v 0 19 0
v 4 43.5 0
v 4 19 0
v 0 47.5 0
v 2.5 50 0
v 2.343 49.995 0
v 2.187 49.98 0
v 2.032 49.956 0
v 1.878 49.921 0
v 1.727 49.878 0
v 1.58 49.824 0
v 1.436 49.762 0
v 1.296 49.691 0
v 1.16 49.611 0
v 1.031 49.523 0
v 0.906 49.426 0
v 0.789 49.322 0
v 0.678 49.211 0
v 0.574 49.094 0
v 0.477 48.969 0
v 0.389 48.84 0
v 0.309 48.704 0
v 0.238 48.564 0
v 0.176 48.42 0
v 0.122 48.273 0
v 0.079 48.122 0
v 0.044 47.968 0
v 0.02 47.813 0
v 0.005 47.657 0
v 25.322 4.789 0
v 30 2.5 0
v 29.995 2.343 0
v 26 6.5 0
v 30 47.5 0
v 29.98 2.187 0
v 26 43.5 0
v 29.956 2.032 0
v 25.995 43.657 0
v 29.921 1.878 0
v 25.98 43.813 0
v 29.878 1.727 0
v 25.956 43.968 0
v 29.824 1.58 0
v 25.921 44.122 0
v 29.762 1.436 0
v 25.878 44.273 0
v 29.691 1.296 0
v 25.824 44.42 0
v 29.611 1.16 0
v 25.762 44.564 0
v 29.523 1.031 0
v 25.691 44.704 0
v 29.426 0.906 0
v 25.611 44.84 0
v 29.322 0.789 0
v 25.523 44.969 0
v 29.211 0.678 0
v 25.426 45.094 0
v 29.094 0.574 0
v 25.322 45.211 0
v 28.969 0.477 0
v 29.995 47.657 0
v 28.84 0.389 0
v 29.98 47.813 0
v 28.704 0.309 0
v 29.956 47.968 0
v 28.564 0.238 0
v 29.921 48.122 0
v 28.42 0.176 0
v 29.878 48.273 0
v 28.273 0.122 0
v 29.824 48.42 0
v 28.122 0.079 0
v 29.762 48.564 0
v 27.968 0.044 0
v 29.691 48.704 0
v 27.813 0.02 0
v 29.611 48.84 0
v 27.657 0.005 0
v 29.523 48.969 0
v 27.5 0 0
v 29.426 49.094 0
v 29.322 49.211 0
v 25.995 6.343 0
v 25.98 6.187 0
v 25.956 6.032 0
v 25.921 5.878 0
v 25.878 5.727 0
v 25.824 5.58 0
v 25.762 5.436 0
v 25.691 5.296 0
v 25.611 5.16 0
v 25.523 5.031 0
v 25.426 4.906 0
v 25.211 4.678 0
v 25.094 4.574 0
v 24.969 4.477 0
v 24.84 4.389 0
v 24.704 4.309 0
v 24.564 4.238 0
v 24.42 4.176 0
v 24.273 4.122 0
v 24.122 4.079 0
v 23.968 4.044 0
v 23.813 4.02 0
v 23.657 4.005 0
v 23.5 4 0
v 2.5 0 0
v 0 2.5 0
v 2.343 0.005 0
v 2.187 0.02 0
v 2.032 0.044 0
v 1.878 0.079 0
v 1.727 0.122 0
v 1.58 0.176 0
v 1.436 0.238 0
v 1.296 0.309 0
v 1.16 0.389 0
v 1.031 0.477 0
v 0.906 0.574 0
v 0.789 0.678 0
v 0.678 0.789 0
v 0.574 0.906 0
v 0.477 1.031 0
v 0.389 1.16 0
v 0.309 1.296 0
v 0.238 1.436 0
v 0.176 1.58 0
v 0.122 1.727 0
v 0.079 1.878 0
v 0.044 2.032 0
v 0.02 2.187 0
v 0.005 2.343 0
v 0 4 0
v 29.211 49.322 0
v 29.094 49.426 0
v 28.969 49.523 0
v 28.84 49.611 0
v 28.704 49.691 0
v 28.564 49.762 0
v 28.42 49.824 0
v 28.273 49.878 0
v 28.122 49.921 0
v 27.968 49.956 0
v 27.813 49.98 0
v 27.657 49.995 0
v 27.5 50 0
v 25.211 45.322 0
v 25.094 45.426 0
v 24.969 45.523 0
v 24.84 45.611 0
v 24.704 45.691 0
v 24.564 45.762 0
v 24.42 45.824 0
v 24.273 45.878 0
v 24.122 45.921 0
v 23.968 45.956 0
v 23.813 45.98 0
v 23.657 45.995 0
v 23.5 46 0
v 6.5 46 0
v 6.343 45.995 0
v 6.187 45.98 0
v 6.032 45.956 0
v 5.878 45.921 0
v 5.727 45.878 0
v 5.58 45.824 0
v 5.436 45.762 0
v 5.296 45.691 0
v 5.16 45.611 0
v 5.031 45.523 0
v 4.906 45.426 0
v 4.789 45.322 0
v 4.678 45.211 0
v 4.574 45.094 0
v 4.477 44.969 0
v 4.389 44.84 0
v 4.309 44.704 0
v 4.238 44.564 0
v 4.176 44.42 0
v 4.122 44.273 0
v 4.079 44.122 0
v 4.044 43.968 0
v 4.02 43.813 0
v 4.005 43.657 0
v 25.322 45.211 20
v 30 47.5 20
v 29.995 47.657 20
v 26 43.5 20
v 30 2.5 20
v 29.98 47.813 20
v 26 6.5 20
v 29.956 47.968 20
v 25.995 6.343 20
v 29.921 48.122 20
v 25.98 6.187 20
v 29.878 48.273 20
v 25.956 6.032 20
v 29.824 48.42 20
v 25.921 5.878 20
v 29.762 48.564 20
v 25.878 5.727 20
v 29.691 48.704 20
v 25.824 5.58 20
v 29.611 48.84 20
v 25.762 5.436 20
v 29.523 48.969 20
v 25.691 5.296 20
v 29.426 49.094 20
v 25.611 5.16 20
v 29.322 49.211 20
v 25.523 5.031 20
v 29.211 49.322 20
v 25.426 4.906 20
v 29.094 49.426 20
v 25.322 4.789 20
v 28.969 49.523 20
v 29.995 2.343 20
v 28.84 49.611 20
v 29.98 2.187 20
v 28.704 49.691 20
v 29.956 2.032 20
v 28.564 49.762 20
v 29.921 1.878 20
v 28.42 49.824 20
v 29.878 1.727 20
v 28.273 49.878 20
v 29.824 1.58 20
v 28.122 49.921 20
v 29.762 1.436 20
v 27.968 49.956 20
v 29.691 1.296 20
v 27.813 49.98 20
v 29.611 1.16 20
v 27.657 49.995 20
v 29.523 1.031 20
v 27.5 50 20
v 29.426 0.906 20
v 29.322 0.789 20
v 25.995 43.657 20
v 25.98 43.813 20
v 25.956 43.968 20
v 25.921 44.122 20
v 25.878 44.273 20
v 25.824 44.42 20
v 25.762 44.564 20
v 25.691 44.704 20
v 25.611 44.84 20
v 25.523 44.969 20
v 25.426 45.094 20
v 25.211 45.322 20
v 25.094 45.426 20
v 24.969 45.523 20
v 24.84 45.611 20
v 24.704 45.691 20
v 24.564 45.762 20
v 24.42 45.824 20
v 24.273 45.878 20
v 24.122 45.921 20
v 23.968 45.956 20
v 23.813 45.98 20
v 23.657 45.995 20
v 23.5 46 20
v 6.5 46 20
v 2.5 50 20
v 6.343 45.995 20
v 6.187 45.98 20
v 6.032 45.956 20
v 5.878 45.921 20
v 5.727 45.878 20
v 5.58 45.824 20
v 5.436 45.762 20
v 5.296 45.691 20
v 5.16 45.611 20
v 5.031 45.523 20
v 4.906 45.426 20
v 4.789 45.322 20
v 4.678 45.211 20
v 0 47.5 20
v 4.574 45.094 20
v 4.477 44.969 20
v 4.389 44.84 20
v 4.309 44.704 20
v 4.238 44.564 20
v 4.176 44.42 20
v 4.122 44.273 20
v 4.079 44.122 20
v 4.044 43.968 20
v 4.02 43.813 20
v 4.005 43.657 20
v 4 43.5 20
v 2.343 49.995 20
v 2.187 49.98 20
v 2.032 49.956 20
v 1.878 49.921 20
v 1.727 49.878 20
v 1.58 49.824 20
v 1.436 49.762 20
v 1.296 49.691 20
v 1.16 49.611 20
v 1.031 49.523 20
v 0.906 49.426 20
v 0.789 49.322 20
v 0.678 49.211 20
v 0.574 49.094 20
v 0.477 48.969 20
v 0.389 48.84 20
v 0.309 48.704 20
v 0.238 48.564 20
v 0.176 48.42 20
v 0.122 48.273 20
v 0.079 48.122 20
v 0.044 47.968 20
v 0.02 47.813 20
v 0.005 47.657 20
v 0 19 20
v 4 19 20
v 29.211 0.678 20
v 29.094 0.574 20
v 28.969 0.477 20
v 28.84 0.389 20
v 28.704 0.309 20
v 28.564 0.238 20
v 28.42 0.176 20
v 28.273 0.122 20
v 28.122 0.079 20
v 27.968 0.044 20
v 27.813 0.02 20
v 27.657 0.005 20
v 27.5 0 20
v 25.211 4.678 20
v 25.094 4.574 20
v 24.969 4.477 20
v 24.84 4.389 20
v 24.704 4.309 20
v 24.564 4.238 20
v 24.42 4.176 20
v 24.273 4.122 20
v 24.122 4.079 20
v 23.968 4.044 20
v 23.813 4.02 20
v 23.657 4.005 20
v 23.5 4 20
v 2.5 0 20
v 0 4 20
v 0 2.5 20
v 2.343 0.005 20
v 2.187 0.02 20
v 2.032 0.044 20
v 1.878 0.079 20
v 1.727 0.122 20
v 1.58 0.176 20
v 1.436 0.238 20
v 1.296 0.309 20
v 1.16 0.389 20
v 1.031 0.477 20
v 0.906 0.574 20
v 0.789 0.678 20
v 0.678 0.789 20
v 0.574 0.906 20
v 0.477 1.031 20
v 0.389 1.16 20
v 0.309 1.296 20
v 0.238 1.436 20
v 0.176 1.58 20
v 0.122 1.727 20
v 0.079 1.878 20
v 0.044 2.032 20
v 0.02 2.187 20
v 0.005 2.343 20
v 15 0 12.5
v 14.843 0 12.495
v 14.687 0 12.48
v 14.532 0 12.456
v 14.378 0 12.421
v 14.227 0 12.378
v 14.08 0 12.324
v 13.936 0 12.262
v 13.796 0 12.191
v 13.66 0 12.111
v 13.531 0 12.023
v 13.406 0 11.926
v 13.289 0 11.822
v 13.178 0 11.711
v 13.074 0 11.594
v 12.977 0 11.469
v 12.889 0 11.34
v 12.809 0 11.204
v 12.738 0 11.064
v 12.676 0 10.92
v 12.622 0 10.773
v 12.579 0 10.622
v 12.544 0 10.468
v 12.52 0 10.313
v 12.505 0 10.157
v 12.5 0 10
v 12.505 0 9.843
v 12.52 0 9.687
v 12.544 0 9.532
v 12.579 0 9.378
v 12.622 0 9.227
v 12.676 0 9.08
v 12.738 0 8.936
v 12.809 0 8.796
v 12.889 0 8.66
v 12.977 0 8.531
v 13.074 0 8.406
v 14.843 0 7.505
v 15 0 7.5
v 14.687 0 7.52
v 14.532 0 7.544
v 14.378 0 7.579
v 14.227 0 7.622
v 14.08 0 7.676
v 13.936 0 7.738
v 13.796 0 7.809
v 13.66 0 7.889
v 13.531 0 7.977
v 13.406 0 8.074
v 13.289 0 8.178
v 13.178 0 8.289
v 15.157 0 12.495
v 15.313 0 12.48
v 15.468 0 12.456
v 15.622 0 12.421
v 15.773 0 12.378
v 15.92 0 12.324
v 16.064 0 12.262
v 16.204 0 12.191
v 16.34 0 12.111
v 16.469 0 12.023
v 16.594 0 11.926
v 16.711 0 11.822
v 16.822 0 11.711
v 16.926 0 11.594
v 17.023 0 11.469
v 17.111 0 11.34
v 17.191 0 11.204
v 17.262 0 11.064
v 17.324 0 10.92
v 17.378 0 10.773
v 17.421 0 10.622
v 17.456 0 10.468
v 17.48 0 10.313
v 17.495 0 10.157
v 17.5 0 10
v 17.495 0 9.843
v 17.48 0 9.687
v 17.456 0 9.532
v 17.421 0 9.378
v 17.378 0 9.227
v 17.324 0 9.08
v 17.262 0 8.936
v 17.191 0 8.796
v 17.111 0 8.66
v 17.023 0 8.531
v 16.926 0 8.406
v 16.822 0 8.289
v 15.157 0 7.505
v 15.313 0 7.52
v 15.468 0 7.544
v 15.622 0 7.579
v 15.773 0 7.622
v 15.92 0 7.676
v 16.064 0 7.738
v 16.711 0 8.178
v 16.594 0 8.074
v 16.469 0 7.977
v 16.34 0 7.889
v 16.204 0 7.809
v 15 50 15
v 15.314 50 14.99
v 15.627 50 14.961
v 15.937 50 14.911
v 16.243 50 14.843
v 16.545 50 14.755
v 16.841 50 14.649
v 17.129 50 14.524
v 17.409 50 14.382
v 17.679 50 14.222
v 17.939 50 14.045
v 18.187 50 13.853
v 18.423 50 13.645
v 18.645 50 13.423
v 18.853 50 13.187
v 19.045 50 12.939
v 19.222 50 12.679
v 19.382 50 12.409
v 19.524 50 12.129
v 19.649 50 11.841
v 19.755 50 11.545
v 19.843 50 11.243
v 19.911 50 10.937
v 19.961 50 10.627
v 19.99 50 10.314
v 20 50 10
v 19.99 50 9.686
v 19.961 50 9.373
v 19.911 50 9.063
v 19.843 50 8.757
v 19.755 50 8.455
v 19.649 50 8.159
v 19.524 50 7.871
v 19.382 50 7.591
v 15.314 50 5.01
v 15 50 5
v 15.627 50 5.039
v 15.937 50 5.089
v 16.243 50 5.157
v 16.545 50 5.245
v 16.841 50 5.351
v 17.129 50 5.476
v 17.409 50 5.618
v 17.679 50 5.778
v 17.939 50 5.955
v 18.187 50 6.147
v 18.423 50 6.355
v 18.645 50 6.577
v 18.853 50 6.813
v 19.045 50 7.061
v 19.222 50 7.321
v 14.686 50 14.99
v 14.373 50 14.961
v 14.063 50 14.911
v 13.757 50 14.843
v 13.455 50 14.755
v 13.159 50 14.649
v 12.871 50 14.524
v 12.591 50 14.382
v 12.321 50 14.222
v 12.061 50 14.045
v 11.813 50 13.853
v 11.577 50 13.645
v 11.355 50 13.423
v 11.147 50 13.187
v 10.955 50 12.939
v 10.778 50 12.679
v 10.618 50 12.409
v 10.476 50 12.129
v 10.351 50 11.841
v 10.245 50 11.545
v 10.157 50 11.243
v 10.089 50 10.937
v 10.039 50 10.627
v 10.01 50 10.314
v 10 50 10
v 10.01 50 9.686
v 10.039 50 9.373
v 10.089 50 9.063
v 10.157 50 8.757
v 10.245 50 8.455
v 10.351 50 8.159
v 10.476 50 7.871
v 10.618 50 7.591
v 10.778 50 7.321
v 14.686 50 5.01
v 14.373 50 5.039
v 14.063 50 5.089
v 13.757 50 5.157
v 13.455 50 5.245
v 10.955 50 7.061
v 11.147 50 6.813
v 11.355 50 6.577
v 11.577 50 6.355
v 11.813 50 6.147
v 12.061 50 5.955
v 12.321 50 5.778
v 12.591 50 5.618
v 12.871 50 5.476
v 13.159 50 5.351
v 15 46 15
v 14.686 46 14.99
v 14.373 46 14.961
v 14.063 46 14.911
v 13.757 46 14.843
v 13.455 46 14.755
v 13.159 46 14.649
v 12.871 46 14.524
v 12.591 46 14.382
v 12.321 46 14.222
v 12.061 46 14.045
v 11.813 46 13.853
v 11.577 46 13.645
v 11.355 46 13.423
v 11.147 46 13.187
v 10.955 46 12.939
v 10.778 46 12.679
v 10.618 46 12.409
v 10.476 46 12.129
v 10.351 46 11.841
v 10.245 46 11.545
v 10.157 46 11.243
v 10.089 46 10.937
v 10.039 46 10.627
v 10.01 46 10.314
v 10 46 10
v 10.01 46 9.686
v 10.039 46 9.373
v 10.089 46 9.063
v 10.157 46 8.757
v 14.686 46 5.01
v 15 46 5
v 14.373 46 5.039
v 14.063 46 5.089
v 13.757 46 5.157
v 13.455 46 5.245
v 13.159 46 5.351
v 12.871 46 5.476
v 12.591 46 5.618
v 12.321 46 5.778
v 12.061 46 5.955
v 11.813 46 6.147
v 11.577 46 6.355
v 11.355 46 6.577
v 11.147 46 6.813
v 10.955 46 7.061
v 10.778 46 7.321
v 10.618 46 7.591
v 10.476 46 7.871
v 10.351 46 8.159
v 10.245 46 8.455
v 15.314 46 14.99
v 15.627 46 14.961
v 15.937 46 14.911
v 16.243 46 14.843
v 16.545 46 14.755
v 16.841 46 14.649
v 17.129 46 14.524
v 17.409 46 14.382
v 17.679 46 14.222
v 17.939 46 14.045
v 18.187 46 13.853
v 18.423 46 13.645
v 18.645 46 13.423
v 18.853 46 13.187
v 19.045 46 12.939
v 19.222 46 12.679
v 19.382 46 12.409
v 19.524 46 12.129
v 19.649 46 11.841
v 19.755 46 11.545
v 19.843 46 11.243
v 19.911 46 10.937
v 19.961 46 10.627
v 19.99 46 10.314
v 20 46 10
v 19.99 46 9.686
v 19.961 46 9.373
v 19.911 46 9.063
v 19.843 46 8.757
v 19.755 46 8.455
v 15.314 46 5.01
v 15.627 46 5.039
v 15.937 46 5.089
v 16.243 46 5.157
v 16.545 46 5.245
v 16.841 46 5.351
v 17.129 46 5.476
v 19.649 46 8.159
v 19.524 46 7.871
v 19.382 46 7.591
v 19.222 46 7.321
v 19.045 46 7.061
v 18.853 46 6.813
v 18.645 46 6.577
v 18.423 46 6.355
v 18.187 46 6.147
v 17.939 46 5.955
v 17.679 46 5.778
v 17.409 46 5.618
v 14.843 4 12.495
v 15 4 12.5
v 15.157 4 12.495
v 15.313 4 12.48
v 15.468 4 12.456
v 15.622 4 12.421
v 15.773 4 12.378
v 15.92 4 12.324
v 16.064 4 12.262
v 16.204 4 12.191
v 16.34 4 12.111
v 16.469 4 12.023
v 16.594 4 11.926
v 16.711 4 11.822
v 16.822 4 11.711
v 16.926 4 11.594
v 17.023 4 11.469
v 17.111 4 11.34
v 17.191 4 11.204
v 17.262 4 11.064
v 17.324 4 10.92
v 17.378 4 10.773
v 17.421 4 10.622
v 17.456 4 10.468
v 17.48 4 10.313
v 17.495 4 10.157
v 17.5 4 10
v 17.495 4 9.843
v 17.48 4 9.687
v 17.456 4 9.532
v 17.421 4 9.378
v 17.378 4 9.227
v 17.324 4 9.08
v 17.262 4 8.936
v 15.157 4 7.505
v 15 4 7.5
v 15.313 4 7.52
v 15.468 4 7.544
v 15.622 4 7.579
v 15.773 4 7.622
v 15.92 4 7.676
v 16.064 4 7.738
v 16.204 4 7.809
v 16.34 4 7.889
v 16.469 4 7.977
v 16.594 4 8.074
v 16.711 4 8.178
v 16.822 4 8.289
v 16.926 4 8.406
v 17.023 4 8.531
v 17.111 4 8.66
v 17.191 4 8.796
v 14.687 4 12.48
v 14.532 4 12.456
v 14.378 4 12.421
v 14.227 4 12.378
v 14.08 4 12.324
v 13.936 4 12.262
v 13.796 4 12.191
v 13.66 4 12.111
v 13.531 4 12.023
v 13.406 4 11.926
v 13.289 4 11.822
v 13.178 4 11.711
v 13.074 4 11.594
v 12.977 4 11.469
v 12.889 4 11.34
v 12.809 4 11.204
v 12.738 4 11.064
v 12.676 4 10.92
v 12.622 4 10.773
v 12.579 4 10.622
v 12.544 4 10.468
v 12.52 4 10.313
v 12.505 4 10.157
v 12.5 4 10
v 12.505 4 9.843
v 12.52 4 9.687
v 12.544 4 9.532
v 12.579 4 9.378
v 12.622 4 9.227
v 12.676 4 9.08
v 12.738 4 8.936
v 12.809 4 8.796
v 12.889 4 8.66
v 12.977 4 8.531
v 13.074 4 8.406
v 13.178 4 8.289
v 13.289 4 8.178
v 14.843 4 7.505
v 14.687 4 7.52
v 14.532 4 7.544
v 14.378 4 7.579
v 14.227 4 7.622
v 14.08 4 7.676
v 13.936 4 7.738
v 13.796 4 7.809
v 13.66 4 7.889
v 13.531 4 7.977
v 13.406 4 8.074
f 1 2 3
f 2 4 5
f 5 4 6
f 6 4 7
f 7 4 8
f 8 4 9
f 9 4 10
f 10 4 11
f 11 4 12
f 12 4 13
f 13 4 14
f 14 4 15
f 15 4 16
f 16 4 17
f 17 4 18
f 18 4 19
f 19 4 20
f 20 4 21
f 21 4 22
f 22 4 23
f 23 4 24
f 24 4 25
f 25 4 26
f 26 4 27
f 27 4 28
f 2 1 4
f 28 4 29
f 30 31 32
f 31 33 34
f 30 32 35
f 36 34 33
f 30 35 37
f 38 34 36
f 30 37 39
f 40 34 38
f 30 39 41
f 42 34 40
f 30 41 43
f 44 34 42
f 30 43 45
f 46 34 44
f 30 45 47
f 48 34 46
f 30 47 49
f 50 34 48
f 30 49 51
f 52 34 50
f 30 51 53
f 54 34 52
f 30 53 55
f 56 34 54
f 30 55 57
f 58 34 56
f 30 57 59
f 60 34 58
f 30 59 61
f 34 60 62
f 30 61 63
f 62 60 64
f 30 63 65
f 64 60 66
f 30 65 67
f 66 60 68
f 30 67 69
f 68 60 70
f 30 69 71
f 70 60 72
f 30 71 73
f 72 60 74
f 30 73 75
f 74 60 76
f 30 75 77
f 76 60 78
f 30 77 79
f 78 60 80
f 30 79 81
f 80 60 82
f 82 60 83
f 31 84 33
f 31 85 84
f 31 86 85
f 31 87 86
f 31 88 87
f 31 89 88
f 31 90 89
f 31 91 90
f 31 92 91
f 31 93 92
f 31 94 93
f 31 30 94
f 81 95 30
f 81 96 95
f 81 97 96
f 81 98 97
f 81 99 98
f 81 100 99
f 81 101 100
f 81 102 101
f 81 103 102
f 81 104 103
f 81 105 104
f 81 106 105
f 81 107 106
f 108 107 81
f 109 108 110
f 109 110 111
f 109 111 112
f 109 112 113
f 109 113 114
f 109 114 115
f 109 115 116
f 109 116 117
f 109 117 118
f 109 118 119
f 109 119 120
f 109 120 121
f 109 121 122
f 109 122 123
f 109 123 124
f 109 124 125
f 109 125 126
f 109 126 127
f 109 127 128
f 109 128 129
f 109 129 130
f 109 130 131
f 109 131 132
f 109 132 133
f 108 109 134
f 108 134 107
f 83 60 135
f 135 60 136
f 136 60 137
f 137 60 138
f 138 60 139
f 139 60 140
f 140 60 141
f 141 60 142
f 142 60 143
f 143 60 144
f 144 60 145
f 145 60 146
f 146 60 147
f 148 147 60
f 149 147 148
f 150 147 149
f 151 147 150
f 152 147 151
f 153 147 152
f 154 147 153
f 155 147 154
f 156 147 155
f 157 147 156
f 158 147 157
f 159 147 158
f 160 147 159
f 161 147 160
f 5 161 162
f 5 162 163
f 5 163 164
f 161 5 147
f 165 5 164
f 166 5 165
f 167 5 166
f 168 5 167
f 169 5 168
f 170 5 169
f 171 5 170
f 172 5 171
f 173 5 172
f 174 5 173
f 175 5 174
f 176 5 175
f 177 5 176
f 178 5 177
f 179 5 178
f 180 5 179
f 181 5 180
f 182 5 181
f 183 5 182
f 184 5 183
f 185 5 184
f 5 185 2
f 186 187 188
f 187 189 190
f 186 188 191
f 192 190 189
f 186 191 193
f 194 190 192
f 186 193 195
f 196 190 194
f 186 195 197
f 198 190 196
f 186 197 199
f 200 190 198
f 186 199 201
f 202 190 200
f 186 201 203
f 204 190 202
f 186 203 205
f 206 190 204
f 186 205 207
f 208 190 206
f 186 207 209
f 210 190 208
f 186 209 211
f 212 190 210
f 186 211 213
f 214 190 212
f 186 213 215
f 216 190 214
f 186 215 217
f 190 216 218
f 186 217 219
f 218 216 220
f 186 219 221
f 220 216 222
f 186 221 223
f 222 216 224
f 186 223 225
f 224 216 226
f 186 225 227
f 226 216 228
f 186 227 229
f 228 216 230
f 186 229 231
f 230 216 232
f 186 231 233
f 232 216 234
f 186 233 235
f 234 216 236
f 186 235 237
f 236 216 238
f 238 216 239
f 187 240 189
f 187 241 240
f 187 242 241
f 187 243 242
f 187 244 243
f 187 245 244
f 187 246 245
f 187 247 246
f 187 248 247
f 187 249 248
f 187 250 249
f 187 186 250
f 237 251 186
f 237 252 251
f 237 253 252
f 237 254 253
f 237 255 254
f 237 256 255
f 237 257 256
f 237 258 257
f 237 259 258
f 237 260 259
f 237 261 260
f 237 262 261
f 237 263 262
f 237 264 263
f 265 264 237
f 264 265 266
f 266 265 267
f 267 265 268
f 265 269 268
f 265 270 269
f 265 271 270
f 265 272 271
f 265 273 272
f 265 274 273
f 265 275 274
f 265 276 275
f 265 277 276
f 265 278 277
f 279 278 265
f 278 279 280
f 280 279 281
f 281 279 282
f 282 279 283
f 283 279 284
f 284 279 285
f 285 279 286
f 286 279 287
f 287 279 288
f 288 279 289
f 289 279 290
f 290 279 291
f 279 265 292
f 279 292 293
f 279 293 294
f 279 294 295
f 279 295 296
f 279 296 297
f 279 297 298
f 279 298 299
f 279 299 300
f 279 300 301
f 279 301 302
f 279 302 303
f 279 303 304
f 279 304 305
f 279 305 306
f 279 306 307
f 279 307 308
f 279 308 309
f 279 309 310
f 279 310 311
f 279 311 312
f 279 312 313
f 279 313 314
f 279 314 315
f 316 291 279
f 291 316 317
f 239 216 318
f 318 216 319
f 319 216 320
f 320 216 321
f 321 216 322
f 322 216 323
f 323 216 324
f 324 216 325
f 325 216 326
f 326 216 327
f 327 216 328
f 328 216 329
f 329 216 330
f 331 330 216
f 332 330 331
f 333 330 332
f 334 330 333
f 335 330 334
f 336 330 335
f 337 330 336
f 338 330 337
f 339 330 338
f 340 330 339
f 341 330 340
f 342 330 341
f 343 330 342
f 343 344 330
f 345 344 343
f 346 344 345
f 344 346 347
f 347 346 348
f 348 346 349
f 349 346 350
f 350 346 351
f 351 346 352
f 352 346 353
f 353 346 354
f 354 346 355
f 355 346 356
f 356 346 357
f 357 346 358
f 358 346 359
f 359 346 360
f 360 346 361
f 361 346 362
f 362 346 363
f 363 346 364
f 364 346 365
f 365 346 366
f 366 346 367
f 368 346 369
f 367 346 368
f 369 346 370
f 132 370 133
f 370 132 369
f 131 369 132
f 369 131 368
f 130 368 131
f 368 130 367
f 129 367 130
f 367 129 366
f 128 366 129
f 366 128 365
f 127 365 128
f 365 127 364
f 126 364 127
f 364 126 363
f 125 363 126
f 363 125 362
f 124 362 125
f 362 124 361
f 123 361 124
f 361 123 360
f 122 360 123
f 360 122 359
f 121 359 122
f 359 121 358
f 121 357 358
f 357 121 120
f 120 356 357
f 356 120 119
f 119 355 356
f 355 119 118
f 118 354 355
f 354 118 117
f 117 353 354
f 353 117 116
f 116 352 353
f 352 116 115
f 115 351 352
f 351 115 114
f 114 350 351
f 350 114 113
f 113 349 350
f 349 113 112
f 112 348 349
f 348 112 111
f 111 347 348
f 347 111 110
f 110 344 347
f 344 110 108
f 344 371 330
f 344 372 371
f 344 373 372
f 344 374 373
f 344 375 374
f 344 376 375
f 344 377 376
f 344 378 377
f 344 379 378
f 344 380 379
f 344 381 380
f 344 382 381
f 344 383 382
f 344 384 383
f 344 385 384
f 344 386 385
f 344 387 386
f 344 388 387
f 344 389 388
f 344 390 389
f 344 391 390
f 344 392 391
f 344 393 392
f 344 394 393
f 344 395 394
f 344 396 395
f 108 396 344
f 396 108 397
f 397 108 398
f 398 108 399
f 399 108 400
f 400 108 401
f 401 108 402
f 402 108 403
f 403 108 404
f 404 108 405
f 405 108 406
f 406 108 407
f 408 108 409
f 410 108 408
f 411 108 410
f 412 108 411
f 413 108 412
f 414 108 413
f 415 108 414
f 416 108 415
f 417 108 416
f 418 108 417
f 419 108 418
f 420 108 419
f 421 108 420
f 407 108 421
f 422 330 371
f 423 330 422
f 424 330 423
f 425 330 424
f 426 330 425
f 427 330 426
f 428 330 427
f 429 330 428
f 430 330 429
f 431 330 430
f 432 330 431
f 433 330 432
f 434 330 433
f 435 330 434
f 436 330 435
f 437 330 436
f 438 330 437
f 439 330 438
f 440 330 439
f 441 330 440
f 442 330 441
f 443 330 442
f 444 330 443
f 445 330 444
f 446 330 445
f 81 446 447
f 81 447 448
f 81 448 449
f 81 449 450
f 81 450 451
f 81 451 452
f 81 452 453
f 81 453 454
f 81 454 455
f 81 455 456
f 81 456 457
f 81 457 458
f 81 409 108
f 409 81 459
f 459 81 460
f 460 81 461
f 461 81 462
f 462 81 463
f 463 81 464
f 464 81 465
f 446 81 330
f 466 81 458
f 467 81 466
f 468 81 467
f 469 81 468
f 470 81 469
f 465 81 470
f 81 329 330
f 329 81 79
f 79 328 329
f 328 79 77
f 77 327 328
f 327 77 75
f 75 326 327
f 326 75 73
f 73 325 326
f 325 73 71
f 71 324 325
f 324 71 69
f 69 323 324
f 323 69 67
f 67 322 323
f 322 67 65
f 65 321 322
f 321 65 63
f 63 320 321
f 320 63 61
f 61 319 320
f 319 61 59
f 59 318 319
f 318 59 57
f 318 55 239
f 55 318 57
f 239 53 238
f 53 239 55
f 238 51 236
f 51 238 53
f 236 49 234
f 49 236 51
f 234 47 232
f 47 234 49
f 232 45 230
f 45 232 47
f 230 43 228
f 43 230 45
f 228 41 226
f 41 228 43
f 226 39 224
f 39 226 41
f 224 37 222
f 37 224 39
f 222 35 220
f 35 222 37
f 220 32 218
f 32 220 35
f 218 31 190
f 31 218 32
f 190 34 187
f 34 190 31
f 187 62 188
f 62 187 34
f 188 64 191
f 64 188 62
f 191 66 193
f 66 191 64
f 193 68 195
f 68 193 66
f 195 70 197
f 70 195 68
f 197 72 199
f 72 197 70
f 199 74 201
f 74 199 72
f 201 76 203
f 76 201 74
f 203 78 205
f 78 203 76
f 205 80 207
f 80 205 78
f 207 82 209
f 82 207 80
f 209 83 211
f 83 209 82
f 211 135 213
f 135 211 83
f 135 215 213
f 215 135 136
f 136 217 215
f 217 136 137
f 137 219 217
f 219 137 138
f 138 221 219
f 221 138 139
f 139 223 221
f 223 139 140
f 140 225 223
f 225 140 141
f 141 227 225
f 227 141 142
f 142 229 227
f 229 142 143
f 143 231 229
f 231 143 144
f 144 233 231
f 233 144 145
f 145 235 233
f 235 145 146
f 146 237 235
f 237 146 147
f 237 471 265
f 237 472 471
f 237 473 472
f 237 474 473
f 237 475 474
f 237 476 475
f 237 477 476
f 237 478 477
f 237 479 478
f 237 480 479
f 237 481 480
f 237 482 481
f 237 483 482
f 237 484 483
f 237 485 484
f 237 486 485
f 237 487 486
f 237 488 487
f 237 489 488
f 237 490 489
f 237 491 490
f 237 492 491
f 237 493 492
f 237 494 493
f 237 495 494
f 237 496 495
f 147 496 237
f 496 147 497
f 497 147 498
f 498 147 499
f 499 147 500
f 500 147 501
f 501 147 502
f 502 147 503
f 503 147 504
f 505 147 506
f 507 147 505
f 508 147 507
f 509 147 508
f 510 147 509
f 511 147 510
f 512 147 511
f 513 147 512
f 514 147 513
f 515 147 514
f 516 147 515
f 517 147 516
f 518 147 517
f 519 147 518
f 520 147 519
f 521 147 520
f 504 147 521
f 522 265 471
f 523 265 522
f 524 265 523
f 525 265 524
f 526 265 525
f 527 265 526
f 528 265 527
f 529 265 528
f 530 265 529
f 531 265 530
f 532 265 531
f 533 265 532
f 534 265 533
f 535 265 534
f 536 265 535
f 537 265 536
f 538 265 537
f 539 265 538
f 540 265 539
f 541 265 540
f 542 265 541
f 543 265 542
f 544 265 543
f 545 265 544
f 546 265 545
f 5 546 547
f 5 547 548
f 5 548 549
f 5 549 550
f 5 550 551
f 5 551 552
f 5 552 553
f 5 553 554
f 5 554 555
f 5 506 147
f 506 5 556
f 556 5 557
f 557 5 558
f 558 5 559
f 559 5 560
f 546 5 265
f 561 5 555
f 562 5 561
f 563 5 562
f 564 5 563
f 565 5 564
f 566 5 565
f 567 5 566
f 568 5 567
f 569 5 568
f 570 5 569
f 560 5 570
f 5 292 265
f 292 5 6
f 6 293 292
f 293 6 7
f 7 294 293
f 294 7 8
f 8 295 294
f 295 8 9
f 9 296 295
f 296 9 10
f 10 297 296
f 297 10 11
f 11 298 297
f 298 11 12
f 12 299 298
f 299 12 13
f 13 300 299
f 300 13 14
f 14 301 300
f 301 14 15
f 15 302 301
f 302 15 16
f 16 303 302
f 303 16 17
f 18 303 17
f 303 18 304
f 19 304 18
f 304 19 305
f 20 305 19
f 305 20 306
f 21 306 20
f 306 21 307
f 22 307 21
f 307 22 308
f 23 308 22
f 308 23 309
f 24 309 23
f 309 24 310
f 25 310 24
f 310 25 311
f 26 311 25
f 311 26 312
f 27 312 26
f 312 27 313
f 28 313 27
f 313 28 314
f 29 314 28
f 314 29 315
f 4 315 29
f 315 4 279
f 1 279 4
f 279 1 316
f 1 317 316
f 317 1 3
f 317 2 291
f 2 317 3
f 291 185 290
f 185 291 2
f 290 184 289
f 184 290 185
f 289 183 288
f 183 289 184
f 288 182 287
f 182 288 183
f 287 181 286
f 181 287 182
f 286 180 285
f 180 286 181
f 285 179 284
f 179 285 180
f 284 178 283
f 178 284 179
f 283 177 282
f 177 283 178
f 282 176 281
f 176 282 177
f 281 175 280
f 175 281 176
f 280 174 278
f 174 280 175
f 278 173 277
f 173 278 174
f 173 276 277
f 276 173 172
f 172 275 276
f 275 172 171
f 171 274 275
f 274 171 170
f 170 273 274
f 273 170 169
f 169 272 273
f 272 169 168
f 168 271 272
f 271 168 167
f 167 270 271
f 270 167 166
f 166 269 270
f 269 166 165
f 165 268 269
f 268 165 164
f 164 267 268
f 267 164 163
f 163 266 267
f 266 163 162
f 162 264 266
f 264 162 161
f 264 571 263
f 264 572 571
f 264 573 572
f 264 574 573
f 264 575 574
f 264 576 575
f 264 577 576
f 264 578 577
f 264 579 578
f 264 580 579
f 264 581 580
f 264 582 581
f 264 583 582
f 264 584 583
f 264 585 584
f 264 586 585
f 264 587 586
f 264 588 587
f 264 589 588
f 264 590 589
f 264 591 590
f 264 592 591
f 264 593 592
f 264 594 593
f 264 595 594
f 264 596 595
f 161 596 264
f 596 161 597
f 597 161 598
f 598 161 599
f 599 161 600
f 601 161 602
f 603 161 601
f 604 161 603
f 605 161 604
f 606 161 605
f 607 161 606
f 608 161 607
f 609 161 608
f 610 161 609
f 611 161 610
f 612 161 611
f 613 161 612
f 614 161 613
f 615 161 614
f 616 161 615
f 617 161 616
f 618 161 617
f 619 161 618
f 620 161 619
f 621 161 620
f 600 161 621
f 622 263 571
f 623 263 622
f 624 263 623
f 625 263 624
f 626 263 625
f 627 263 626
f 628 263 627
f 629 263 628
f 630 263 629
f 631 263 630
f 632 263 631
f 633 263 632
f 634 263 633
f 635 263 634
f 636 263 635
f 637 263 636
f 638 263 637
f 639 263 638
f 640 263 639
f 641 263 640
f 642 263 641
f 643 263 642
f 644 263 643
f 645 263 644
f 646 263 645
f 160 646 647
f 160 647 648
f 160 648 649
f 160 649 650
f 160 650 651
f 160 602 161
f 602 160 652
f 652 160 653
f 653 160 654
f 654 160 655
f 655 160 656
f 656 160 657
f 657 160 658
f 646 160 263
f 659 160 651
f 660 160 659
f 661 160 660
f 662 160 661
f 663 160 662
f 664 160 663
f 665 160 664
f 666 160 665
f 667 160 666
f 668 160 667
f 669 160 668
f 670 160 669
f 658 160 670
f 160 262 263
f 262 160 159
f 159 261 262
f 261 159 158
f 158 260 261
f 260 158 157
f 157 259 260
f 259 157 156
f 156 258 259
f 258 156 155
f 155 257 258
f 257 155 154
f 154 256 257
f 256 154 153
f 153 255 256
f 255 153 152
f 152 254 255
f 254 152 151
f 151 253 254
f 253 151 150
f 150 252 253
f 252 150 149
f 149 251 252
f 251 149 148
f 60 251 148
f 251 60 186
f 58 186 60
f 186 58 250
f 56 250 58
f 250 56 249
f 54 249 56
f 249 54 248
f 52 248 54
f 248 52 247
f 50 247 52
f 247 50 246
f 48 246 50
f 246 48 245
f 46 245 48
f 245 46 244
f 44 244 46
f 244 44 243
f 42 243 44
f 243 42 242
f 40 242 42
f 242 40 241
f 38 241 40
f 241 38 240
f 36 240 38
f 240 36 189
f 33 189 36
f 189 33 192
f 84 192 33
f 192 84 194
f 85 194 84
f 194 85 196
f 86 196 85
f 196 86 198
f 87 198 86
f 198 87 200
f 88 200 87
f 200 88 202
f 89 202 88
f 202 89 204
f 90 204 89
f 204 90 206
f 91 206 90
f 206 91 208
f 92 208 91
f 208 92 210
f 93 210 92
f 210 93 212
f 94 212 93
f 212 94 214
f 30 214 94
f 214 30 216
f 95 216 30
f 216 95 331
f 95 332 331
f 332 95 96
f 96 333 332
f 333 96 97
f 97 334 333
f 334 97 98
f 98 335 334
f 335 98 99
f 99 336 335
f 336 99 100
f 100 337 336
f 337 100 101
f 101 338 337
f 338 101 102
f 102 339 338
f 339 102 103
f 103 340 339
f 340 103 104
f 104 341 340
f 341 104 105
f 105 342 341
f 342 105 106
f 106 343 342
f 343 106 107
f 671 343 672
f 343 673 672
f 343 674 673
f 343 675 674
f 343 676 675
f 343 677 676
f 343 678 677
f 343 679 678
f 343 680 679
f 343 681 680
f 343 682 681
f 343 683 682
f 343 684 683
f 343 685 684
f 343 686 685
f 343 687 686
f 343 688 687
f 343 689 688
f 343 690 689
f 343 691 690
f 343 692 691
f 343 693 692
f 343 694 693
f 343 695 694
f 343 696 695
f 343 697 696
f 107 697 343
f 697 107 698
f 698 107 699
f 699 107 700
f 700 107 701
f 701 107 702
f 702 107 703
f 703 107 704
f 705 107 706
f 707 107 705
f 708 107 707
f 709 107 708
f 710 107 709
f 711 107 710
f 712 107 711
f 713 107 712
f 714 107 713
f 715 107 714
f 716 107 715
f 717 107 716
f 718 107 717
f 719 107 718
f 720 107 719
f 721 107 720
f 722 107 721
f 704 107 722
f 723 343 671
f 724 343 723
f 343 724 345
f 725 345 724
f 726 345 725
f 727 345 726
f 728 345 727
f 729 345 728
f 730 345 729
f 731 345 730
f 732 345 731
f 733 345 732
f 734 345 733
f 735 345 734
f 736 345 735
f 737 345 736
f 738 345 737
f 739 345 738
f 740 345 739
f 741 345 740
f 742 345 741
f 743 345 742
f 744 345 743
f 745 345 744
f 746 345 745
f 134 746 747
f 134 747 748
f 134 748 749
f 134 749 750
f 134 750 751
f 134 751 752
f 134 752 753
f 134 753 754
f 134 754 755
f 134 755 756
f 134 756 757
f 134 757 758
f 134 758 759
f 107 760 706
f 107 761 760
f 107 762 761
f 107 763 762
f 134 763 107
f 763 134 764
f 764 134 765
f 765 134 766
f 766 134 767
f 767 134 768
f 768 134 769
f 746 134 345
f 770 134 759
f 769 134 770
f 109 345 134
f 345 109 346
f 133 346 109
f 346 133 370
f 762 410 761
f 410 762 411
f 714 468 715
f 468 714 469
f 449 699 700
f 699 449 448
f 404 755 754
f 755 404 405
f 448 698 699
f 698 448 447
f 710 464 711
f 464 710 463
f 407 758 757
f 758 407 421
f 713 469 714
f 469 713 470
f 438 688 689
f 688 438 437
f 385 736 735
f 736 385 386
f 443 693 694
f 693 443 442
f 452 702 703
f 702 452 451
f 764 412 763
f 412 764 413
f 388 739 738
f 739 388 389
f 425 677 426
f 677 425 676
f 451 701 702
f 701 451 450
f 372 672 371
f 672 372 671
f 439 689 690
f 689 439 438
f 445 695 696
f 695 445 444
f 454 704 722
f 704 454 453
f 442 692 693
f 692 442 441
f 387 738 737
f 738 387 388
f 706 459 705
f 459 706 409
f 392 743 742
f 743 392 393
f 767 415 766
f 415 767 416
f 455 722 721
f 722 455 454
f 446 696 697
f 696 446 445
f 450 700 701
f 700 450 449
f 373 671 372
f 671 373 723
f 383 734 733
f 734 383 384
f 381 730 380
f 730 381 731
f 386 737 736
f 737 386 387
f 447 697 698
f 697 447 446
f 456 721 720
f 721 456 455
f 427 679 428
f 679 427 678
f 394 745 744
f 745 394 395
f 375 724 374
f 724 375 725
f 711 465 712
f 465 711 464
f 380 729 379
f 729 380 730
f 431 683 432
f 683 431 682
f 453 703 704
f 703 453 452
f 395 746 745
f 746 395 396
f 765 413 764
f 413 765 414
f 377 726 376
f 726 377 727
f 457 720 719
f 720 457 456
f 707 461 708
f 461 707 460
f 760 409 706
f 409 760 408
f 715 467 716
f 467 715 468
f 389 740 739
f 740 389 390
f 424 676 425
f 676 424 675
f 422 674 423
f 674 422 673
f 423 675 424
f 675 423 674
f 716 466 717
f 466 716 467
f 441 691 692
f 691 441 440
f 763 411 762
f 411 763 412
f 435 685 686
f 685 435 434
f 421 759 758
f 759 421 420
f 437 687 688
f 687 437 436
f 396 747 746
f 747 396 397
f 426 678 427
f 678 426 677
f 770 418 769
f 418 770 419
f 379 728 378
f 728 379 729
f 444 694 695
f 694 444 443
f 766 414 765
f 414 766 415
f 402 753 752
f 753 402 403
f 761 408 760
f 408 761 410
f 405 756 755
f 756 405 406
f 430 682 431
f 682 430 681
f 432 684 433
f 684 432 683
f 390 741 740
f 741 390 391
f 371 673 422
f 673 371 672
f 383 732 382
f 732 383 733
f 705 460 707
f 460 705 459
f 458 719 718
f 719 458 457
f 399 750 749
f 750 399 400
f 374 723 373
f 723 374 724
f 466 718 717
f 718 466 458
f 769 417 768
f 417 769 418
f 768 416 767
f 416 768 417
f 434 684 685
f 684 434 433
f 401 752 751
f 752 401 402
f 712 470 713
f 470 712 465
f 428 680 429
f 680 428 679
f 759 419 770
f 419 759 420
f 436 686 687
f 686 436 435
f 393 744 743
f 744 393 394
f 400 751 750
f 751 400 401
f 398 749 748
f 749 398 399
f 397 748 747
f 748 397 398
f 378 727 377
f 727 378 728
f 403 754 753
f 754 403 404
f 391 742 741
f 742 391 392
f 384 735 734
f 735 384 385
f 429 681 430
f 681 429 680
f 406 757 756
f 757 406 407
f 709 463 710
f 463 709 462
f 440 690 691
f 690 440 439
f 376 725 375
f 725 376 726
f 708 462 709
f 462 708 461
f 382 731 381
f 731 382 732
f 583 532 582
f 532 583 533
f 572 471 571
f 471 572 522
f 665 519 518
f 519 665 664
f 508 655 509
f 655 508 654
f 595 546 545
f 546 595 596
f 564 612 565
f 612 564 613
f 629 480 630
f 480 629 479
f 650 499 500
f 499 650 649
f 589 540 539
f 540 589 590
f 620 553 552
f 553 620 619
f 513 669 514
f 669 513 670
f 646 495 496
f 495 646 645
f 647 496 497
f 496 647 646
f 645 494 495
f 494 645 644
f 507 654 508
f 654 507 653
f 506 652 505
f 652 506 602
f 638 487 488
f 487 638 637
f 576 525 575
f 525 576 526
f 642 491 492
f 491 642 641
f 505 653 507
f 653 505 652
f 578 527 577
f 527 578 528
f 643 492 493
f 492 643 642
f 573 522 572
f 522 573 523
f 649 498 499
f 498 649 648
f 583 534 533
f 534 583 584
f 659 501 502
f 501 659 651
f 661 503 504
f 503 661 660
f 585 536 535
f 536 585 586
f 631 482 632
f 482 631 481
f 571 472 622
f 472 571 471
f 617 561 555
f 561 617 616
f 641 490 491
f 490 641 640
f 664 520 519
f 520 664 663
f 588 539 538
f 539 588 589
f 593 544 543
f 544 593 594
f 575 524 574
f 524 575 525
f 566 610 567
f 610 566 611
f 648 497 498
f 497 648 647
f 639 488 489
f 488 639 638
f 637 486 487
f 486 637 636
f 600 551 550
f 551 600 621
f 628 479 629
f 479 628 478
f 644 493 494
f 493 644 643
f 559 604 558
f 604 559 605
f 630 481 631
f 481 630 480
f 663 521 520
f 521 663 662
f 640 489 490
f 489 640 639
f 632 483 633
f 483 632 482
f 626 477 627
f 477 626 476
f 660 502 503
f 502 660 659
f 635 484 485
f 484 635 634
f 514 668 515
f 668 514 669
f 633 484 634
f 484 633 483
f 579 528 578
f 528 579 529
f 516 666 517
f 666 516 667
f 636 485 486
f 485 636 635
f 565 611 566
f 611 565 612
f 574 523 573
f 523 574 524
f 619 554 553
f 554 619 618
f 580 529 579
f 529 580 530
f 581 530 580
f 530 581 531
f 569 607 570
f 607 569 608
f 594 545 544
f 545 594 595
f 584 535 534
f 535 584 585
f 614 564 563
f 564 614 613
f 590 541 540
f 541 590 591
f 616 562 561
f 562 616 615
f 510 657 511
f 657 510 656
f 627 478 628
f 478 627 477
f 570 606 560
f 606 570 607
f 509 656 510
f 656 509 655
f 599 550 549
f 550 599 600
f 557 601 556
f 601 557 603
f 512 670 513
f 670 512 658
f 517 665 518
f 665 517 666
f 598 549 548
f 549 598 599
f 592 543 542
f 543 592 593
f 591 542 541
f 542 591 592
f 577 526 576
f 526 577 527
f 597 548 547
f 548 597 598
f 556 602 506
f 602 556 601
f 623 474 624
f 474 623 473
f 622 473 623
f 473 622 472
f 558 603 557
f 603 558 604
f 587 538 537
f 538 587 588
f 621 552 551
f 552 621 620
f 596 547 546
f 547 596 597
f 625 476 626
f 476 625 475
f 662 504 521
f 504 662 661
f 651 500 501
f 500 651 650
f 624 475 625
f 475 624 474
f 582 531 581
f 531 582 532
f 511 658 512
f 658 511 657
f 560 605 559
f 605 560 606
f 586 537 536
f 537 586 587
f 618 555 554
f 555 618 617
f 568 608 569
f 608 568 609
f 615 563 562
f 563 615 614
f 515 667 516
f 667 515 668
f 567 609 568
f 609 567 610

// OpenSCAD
H = 50;
D = 30;
W = 20;
CD = 5; /* corner diameter */
WT = 4; /* wall thickness */
CW = 10; /* cutout width */
CH = 15; /* cutout height */
SHD = 5; /* screw hole diameter */
SDHD = 10; /* screwdriver hole diameter */

$fn = 100;

module roundedRectangle(x,y,d) {
    translate([d/2,d/2]) minkowski() {
        square([x-d,y-d]);
        circle(d=d);
    }
}

difference() {
    linear_extrude(W) difference() {
        roundedRectangle(D,H,CD);
        translate([WT,WT]) roundedRectangle(D-2*WT,H-2*WT,CD);
        translate([0,WT]) square([CW,CH]);
    }
    /* screw hole: */
    translate([D/2,0,W/2]) rotate([-90,0,0]) cylinder(d=SHD, h=WT);
    /* screwdriver hole: */
    translate([D/2,H,W/2]) rotate([90,0,0]) cylinder(d=SDHD, h=WT);
}
